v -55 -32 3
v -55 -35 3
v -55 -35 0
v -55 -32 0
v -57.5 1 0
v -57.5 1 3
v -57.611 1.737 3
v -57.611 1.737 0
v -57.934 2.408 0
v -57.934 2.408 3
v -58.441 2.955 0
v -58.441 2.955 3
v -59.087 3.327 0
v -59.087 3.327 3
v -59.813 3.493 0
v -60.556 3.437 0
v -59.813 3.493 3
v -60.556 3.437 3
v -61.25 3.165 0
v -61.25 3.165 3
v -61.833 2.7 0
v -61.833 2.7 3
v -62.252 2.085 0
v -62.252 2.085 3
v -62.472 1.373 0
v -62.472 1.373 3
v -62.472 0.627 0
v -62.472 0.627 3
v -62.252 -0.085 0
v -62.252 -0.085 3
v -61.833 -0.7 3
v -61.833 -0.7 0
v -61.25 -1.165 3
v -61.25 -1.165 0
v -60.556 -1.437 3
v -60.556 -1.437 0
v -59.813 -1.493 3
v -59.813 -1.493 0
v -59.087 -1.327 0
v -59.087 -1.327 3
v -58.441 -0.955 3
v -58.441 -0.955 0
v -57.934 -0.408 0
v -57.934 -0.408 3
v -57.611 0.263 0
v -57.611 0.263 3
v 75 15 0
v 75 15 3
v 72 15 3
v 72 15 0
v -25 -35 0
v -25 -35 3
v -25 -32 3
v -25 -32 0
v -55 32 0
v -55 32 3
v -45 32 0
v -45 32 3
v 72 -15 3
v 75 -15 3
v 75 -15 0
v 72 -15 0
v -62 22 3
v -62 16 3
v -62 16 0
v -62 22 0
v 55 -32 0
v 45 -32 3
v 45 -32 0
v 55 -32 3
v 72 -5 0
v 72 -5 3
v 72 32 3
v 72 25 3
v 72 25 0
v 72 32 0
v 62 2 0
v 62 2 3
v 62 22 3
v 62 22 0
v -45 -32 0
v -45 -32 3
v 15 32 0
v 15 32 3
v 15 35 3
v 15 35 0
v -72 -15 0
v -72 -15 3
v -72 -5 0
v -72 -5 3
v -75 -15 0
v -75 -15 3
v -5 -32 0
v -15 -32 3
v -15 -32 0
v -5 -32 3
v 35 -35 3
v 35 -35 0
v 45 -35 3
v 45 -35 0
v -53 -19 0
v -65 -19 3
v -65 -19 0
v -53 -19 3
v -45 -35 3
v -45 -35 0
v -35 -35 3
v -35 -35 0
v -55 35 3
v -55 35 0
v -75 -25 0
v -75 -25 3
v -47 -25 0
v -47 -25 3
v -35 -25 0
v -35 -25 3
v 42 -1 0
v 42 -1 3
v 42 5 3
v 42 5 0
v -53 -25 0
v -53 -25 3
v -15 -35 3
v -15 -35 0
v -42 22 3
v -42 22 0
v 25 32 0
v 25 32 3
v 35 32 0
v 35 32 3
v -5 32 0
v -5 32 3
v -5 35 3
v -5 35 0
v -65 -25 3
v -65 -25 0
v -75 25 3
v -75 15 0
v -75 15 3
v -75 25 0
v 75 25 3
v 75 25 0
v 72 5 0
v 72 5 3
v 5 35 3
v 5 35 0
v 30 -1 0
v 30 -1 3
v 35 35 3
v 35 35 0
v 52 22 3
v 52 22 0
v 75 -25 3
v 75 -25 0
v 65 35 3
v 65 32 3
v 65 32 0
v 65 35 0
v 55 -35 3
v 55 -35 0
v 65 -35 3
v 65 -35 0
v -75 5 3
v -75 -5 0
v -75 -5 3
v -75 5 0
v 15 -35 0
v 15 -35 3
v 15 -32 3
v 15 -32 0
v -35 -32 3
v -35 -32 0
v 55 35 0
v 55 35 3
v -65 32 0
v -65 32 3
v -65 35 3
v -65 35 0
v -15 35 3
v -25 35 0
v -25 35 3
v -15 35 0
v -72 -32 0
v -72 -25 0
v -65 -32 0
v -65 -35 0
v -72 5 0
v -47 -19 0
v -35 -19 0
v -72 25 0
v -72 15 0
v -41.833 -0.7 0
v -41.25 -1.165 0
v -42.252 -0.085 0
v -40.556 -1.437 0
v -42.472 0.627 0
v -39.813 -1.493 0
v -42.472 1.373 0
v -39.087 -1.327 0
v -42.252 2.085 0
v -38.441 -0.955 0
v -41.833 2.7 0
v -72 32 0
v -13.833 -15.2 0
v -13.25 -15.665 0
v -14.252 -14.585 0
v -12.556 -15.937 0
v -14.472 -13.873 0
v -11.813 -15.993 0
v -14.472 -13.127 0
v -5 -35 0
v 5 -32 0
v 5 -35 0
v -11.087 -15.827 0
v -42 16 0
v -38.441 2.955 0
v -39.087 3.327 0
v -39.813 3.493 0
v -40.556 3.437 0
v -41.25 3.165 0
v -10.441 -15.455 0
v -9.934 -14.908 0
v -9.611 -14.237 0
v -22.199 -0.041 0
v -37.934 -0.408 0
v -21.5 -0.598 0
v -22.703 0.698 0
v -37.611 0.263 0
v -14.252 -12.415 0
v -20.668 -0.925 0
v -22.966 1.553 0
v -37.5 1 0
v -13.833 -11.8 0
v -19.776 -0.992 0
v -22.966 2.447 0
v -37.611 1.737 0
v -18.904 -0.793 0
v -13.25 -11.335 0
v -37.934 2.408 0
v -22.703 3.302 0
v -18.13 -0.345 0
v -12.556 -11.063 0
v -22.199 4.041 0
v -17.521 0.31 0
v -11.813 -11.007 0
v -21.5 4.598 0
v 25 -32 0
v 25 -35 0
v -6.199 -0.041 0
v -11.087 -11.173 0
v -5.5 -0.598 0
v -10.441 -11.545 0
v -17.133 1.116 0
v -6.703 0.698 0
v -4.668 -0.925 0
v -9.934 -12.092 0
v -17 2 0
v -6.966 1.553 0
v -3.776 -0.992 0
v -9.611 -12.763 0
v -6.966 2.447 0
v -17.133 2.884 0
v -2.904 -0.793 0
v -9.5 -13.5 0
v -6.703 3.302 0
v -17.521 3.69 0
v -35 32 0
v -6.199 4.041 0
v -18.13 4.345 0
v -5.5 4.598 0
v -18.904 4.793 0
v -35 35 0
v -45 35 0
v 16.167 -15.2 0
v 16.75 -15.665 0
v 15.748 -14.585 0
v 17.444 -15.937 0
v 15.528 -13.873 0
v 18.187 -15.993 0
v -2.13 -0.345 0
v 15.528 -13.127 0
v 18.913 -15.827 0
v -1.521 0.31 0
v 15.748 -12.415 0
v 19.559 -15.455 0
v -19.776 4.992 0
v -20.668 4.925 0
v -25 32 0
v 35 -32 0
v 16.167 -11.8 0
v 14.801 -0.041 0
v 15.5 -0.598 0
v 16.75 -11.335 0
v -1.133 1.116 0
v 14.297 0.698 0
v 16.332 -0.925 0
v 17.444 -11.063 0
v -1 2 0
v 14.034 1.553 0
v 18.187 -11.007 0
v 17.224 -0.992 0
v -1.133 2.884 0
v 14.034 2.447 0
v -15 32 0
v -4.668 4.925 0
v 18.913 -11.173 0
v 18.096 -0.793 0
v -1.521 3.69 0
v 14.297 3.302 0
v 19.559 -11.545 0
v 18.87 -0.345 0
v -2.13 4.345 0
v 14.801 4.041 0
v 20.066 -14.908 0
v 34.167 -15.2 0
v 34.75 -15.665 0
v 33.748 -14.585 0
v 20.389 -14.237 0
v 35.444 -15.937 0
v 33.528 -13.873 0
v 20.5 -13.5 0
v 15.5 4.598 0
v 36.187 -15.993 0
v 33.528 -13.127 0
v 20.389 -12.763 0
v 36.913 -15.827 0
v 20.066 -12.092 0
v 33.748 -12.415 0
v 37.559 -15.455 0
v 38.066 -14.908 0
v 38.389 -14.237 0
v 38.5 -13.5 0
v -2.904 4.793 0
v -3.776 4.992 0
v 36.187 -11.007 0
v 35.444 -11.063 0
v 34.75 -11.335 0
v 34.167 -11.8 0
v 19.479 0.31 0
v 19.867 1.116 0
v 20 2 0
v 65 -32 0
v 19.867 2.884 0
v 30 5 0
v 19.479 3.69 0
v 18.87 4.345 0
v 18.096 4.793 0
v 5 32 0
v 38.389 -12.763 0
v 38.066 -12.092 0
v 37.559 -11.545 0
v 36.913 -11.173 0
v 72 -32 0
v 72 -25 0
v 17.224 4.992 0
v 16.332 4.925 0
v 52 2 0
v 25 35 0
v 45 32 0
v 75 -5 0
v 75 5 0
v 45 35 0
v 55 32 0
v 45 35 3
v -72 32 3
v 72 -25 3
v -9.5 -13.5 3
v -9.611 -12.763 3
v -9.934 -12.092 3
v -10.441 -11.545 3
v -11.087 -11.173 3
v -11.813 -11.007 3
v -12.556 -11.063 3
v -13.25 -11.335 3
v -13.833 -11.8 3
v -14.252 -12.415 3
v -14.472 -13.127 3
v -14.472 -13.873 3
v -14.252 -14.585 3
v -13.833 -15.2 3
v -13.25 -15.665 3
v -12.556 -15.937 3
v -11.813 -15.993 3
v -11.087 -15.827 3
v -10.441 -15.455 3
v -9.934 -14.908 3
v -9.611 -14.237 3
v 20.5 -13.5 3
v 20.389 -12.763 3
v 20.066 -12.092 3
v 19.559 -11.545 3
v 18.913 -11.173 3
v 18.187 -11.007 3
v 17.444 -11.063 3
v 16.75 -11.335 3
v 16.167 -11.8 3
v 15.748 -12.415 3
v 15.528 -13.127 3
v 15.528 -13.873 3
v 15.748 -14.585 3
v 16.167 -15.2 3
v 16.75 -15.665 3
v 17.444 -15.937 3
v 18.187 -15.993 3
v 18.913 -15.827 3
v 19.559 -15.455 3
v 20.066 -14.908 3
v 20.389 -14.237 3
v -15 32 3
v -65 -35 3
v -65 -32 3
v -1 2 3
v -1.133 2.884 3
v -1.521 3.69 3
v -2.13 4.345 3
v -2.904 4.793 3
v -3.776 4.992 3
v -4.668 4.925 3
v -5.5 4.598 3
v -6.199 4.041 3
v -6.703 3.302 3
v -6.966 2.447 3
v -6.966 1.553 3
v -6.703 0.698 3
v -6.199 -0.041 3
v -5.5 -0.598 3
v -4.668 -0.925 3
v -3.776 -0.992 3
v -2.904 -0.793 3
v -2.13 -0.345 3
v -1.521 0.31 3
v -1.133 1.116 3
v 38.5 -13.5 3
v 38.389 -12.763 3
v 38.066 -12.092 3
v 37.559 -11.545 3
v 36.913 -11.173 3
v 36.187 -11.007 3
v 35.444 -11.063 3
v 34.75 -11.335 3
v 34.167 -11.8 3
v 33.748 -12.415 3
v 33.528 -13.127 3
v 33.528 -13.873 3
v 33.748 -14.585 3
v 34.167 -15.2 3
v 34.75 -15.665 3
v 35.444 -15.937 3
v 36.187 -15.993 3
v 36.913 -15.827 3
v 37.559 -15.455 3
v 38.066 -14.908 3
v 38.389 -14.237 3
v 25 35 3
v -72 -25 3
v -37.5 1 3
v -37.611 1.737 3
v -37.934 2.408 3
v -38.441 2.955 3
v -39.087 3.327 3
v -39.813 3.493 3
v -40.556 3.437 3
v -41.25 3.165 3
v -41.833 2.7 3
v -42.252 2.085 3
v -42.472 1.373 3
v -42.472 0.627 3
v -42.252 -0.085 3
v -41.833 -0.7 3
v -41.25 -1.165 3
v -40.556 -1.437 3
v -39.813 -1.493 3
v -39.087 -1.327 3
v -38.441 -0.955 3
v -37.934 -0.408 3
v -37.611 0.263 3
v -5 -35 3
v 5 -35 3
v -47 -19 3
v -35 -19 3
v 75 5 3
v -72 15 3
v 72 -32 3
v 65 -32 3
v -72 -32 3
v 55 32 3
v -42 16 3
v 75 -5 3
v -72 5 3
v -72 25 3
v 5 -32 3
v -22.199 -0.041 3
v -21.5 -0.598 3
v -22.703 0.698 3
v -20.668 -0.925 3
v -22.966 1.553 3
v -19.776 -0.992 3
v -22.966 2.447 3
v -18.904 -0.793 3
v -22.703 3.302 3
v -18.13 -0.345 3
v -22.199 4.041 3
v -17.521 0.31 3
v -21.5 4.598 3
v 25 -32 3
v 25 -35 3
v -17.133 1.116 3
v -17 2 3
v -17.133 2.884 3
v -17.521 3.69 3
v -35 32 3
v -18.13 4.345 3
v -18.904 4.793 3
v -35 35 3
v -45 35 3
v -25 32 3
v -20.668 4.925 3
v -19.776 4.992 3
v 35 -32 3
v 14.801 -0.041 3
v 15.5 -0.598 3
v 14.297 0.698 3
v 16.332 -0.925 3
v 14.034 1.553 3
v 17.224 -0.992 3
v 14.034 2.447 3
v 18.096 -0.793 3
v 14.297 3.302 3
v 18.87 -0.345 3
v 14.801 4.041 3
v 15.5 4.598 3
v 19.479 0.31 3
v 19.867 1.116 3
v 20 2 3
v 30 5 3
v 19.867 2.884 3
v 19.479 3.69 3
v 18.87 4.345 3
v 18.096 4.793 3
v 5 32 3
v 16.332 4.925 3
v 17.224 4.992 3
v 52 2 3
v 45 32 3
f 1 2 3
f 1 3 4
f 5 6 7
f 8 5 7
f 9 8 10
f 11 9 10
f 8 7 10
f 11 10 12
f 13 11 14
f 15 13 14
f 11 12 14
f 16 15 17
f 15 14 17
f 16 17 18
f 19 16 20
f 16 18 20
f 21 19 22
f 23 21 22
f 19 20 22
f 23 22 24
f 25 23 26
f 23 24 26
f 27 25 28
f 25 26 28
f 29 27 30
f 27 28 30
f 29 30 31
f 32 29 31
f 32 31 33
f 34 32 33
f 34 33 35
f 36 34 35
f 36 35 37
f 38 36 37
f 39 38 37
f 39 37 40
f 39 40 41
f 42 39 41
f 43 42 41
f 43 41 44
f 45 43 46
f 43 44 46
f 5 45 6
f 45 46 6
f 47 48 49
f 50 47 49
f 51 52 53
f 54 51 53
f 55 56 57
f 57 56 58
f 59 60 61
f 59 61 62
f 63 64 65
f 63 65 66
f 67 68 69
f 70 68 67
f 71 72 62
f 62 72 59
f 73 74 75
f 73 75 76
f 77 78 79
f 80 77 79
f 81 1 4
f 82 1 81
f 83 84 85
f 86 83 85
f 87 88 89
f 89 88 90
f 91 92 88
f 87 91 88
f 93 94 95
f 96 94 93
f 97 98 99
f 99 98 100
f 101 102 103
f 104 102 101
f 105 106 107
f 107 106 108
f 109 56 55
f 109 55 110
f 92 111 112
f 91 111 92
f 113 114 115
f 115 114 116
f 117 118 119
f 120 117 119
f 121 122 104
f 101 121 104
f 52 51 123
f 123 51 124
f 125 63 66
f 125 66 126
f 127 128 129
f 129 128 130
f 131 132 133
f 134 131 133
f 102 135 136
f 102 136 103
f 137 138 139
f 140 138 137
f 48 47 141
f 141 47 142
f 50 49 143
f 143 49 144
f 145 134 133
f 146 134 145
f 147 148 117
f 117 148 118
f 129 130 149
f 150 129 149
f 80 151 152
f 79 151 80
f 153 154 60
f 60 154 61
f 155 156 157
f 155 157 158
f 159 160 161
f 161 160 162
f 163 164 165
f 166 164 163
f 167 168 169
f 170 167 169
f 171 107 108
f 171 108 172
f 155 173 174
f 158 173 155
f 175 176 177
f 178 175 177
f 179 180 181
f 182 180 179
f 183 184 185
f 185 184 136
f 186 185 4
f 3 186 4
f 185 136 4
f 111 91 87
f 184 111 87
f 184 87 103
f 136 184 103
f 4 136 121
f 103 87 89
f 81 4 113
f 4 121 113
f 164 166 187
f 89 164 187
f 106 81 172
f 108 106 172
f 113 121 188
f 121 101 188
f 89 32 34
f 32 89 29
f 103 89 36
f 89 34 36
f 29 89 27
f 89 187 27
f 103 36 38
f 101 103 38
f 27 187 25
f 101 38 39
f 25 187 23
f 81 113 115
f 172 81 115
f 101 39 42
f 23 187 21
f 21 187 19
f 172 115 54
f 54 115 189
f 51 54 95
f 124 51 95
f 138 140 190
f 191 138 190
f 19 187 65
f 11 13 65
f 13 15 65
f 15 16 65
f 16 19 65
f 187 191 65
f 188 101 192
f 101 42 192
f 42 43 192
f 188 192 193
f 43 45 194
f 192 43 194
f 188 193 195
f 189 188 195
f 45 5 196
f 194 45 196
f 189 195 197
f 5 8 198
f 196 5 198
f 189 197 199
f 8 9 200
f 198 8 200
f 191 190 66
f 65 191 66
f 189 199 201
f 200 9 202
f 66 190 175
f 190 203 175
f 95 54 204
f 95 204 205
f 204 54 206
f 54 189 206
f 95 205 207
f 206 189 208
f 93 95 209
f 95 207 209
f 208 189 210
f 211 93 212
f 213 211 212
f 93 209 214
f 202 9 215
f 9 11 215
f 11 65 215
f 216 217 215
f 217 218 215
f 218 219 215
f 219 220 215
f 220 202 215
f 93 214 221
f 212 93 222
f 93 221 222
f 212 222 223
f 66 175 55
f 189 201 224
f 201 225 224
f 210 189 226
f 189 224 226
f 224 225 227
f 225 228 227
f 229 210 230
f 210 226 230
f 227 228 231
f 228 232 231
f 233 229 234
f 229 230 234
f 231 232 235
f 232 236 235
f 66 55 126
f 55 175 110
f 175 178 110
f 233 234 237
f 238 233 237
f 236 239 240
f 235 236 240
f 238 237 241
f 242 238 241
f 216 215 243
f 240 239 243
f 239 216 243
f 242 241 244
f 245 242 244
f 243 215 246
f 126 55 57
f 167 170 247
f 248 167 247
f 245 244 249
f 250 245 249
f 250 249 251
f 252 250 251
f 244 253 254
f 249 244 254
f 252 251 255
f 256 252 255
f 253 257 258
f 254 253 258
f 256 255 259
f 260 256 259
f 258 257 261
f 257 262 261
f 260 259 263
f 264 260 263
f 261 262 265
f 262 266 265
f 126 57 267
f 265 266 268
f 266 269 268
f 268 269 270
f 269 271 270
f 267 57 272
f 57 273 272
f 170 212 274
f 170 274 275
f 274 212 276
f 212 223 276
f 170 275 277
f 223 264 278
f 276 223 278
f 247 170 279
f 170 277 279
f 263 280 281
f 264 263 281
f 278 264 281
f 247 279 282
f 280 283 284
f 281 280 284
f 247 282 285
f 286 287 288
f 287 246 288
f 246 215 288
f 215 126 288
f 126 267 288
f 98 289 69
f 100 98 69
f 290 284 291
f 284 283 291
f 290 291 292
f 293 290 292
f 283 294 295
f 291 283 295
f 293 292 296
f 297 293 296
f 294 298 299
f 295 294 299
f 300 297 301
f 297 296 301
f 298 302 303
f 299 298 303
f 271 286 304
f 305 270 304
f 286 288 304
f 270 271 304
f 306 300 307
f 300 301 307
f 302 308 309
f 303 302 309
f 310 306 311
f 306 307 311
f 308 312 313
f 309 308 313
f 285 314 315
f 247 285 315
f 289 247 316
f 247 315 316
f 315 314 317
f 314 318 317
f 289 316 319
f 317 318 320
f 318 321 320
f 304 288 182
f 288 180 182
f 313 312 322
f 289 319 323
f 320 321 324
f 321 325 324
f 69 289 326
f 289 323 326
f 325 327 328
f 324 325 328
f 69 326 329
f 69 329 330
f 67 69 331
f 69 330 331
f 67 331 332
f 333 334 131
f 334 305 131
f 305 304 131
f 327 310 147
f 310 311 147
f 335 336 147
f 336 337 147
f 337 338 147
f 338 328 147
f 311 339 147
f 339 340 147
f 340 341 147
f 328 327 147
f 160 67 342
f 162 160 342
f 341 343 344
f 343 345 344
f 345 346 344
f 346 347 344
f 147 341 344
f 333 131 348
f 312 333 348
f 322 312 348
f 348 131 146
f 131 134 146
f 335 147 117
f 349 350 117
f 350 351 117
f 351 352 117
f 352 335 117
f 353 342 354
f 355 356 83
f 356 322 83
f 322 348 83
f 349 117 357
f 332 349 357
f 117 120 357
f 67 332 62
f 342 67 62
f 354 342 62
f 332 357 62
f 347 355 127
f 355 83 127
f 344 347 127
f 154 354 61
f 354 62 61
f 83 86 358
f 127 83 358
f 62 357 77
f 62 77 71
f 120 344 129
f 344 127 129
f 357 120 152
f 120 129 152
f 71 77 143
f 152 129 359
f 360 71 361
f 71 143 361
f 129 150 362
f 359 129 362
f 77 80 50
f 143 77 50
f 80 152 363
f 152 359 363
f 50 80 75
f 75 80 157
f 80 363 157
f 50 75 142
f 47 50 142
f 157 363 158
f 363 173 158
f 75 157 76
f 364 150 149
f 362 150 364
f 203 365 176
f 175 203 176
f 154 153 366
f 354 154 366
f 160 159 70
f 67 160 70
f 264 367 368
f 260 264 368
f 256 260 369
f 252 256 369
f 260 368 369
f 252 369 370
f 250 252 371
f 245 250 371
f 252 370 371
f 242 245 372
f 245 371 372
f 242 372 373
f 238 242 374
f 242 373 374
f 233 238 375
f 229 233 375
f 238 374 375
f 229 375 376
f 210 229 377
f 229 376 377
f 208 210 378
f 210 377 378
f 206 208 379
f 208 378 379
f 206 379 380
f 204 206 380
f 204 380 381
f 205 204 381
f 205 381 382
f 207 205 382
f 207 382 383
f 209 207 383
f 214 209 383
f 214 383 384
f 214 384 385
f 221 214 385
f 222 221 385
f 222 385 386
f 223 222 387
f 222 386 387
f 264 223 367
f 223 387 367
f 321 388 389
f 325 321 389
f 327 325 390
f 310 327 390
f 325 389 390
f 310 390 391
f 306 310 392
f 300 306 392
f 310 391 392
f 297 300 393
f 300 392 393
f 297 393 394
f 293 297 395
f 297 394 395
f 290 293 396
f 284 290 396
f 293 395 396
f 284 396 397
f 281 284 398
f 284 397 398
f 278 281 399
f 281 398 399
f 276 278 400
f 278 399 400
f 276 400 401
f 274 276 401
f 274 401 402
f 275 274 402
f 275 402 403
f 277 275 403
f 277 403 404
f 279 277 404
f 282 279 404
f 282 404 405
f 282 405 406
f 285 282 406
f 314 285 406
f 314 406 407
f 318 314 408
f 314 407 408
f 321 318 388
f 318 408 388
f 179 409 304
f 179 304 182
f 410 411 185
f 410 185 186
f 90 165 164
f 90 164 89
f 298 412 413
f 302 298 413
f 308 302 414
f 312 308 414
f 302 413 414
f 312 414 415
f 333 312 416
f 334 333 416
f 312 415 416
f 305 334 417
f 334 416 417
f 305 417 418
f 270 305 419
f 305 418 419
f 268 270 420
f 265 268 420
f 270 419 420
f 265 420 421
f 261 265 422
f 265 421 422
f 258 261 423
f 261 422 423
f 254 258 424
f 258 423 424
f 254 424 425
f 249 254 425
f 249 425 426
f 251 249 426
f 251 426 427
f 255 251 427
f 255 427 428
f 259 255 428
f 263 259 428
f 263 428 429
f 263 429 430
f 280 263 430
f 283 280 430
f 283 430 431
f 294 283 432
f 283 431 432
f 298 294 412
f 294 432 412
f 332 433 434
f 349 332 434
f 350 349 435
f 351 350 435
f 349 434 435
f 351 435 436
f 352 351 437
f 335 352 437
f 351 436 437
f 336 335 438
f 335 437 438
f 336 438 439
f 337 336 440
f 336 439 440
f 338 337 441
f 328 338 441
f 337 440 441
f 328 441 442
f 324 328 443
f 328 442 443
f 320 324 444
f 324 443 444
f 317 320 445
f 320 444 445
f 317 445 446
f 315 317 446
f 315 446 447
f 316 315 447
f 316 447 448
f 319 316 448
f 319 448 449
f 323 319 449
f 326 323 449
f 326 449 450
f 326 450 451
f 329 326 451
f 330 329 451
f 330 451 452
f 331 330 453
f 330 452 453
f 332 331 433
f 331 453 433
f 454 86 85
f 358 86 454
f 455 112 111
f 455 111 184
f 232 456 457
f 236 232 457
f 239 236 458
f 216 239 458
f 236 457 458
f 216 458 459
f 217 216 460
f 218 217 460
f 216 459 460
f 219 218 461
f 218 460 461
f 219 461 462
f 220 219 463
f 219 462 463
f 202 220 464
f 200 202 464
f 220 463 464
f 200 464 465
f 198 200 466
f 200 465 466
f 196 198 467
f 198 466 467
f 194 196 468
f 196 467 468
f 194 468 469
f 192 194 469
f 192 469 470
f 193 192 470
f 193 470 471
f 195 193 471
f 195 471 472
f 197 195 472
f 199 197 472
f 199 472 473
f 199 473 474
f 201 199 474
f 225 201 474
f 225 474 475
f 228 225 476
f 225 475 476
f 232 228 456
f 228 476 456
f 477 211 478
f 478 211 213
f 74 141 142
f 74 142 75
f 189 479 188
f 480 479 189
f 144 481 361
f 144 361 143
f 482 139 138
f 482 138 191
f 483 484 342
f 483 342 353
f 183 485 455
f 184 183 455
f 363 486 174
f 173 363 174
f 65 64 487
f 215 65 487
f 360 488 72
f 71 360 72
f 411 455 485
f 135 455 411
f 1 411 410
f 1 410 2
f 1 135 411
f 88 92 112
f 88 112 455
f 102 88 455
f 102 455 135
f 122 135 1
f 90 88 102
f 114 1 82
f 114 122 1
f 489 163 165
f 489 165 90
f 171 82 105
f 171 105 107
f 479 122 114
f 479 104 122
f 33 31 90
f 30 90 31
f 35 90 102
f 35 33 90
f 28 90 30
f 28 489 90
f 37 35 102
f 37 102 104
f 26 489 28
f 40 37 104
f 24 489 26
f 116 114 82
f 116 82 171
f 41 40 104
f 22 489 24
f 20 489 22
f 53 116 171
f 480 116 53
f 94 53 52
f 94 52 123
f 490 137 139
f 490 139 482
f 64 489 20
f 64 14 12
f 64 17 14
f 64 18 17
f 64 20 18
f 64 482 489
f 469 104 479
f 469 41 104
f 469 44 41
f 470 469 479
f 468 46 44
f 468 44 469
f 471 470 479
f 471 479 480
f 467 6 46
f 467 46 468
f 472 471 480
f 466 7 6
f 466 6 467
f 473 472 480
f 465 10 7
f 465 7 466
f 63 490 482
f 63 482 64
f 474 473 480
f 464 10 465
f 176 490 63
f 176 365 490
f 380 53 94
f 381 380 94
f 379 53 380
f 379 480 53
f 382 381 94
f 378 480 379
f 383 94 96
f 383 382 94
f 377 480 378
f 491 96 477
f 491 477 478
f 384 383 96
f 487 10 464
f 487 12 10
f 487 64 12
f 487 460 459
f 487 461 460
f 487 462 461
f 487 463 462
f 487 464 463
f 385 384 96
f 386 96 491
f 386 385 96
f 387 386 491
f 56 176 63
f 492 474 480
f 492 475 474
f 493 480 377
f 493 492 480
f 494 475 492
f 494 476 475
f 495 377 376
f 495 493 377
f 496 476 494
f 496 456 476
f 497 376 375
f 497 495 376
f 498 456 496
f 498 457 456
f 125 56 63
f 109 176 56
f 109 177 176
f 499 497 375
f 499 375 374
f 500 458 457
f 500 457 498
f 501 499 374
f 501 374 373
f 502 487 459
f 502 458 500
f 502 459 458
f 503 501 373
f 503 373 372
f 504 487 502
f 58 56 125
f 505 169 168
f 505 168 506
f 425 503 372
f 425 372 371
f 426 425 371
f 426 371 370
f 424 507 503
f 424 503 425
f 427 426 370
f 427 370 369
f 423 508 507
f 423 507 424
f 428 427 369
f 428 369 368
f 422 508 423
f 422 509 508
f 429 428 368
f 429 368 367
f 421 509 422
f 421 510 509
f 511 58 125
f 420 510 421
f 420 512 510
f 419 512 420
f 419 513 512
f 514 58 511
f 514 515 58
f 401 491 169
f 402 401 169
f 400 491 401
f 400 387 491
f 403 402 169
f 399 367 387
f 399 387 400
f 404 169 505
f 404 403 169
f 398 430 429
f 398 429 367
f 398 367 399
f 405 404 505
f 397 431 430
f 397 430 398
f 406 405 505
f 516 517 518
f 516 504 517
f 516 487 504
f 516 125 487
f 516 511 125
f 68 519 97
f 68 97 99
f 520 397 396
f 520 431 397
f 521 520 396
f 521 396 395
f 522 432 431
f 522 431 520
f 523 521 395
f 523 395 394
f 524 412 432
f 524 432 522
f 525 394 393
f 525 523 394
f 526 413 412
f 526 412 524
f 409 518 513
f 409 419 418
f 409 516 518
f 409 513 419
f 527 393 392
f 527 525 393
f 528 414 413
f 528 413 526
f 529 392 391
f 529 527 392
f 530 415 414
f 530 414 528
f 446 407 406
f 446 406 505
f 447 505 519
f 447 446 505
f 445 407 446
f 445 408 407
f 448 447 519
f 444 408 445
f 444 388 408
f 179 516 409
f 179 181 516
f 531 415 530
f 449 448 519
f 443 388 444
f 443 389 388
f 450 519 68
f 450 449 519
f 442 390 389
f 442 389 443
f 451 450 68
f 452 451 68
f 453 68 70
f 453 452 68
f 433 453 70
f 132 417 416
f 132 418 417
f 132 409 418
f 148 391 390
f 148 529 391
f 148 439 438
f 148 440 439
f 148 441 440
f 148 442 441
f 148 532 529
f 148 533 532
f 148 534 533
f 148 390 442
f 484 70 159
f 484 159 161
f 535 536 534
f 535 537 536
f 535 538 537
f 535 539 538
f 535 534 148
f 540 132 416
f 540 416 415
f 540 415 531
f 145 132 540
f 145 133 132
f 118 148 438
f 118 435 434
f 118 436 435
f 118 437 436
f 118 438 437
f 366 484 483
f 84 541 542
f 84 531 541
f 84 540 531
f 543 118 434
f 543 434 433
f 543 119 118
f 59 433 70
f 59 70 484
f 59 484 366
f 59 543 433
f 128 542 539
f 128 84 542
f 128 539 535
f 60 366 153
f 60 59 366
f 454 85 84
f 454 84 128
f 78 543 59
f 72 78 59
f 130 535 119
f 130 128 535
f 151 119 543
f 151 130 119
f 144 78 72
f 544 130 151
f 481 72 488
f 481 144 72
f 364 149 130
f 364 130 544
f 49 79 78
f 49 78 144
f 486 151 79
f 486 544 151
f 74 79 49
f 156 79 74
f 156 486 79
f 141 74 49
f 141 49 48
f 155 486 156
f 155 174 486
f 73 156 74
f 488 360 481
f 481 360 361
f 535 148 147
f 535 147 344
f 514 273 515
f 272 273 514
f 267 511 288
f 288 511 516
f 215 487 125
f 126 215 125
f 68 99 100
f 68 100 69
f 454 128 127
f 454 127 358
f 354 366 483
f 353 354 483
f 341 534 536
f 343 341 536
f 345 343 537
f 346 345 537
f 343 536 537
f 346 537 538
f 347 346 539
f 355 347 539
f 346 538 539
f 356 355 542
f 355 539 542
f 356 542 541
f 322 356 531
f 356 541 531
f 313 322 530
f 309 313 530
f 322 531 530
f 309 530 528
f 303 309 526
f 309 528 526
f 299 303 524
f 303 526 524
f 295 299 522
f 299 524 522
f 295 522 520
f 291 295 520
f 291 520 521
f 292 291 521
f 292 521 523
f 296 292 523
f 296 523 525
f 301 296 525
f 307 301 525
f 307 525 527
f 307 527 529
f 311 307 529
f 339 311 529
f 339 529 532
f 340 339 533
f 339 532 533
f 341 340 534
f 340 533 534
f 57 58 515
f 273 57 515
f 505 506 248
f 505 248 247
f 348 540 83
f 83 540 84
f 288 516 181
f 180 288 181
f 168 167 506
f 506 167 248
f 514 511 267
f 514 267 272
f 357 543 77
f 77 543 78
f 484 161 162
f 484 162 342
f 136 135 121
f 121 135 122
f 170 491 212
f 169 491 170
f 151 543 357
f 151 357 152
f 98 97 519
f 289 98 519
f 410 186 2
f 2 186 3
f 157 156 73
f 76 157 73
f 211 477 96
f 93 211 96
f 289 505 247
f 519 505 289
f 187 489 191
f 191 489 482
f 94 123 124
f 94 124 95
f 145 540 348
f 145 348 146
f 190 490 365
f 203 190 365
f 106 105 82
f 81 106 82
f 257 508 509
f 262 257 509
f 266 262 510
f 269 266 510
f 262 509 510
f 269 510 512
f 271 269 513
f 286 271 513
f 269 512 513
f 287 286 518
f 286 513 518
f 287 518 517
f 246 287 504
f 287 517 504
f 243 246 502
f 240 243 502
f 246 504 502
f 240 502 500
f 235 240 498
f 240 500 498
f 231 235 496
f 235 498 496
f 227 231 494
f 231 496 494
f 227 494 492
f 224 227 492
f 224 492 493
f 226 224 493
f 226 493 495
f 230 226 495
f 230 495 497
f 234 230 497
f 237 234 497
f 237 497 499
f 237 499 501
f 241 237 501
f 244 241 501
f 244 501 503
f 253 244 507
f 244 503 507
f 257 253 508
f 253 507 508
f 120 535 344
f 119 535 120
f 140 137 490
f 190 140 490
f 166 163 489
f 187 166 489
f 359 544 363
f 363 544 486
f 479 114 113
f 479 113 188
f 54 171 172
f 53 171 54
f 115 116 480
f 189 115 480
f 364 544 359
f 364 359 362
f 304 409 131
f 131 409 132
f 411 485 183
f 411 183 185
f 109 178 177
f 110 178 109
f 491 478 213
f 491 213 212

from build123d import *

# Parameters (mm, degrees)
SKETCH1_W               = 150
SKETCH1_H               = 70
BOSS_EXTRUDE1_DEPTH     = 3
SKETCH2_W               = 10
SKETCH2_H               = 3
CUT_EXTRUDE1_DEPTH      = 3
LPATTERN3_COUNT         = 8
LPATTERN3_PITCH         = 20
MIRROR1_COPY_1_SKETCH_W = 10
MIRROR1_COPY_1_SKETCH_H = 3
MIRROR1_COPY_1_DEPTH    = 3
MIRROR1_COPY_2_SKETCH_W = 10
MIRROR1_COPY_2_SKETCH_H = 3
MIRROR1_COPY_2_DEPTH    = 3
MIRROR1_COPY_3_SKETCH_W = 10
MIRROR1_COPY_3_SKETCH_H = 3
MIRROR1_COPY_3_DEPTH    = 3
MIRROR1_COPY_4_SKETCH_W = 10
MIRROR1_COPY_4_SKETCH_H = 3
MIRROR1_COPY_4_DEPTH    = 3
MIRROR1_COPY_5_SKETCH_W = 10
MIRROR1_COPY_5_SKETCH_H = 3
MIRROR1_COPY_5_DEPTH    = 3
MIRROR1_COPY_6_SKETCH_W = 10
MIRROR1_COPY_6_SKETCH_H = 3
MIRROR1_COPY_6_DEPTH    = 3
MIRROR1_COPY_7_SKETCH_W = 10
MIRROR1_COPY_7_SKETCH_H = 3
MIRROR1_COPY_7_DEPTH    = 3
SKETCH3_W               = 3
SKETCH3_H               = 10
CUT_EXTRUDE2_DEPTH      = 3
LPATTERN4_COUNT         = 4
LPATTERN4_PITCH         = 20
MIRROR2_COPY_1_SKETCH_W = 3
MIRROR2_COPY_1_SKETCH_H = 10
MIRROR2_COPY_1_DEPTH    = 3
MIRROR2_COPY_2_SKETCH_W = 3
MIRROR2_COPY_2_SKETCH_H = 10
MIRROR2_COPY_2_DEPTH    = 3
MIRROR2_COPY_3_SKETCH_W = 3
MIRROR2_COPY_3_SKETCH_H = 10
MIRROR2_COPY_3_DEPTH    = 3
SKETCH4_W               = 20
SKETCH4_H               = 6
CUT_EXTRUDE3_DEPTH      = 3
SKETCH5_R               = 2.5
CUT_EXTRUDE5_DEPTH      = 3
SKETCH6_W               = 12
SKETCH6_H               = 6
CUT_EXTRUDE6_DEPTH      = 3
SKETCH7_R               = 3
CUT_EXTRUDE7_DEPTH      = 3
SKETCH8_R               = 2.5
CUT_EXTRUDE8_DEPTH      = 3
SKETCH9_R               = 3
CUT_EXTRUDE9_DEPTH      = 3
SKETCH10_W              = 12
SKETCH10_H              = 6
CUT_EXTRUDE10_DEPTH     = 3
SKETCH11_R              = 2.5
CUT_EXTRUDE11_DEPTH     = 3
SKETCH12_W              = 10
SKETCH12_H              = 20
CUT_EXTRUDE12_DEPTH     = 3


with BuildPart() as part:
    # Sketch1 → Boss-Extrude1 (new body)
    with BuildSketch(Plane.XY):
        Rectangle(SKETCH1_W, SKETCH1_H)
    extrude(amount=BOSS_EXTRUDE1_DEPTH)

    # Sketch2 → Cut-Extrude1 (cut)
    with BuildSketch(Plane.XY.offset(3)):
        with Locations((-70, 33.5)):
            Rectangle(SKETCH2_W, SKETCH2_H)
    cut_extrude1 = extrude(amount=-CUT_EXTRUDE1_DEPTH, mode=Mode.SUBTRACT)

    # LPattern3: Cut-Extrude1 ×8
    with Locations(*[(i * LPATTERN3_PITCH, 0, 0) for i in range(1, LPATTERN3_COUNT)]):
        add(cut_extrude1, mode=Mode.SUBTRACT)

    # Mirror1: Cut-Extrude1 across plane
    add(cut_extrude1.mirror(Plane.ZX), mode=Mode.SUBTRACT)

    # Mirror1 copy 1 sketch → Mirror1 copy 1 (cut)
    with BuildSketch(Plane(origin=(20, 0, 3), x_dir=(1, 0, 0), z_dir=(0, 0, 1))):
        with Locations((-70, -33.5)):
            Rectangle(MIRROR1_COPY_1_SKETCH_W, MIRROR1_COPY_1_SKETCH_H)
    extrude(amount=-MIRROR1_COPY_1_DEPTH, mode=Mode.SUBTRACT)

    # Mirror1 copy 2 sketch → Mirror1 copy 2 (cut)
    with BuildSketch(Plane(origin=(40, 0, 3), x_dir=(1, 0, 0), z_dir=(0, 0, 1))):
        with Locations((-70, -33.5)):
            Rectangle(MIRROR1_COPY_2_SKETCH_W, MIRROR1_COPY_2_SKETCH_H)
    extrude(amount=-MIRROR1_COPY_2_DEPTH, mode=Mode.SUBTRACT)

    # Mirror1 copy 3 sketch → Mirror1 copy 3 (cut)
    with BuildSketch(Plane(origin=(60, 0, 3), x_dir=(1, 0, 0), z_dir=(0, 0, 1))):
        with Locations((-70, -33.5)):
            Rectangle(MIRROR1_COPY_3_SKETCH_W, MIRROR1_COPY_3_SKETCH_H)
    extrude(amount=-MIRROR1_COPY_3_DEPTH, mode=Mode.SUBTRACT)

    # Mirror1 copy 4 sketch → Mirror1 copy 4 (cut)
    with BuildSketch(Plane(origin=(80, 0, 3), x_dir=(1, 0, 0), z_dir=(0, 0, 1))):
        with Locations((-70, -33.5)):
            Rectangle(MIRROR1_COPY_4_SKETCH_W, MIRROR1_COPY_4_SKETCH_H)
    extrude(amount=-MIRROR1_COPY_4_DEPTH, mode=Mode.SUBTRACT)

    # Mirror1 copy 5 sketch → Mirror1 copy 5 (cut)
    with BuildSketch(Plane(origin=(100, 0, 3), x_dir=(1, 0, 0), z_dir=(0, 0, 1))):
        with Locations((-70, -33.5)):
            Rectangle(MIRROR1_COPY_5_SKETCH_W, MIRROR1_COPY_5_SKETCH_H)
    extrude(amount=-MIRROR1_COPY_5_DEPTH, mode=Mode.SUBTRACT)

    # Mirror1 copy 6 sketch → Mirror1 copy 6 (cut)
    with BuildSketch(Plane(origin=(120, 0, 3), x_dir=(1, 0, 0), z_dir=(0, 0, 1))):
        with Locations((-70, -33.5)):
            Rectangle(MIRROR1_COPY_6_SKETCH_W, MIRROR1_COPY_6_SKETCH_H)
    extrude(amount=-MIRROR1_COPY_6_DEPTH, mode=Mode.SUBTRACT)

    # Mirror1 copy 7 sketch → Mirror1 copy 7 (cut)
    with BuildSketch(Plane(origin=(140, 0, 3), x_dir=(1, 0, 0), z_dir=(0, 0, 1))):
        with Locations((-70, -33.5)):
            Rectangle(MIRROR1_COPY_7_SKETCH_W, MIRROR1_COPY_7_SKETCH_H)
    extrude(amount=-MIRROR1_COPY_7_DEPTH, mode=Mode.SUBTRACT)

    # Sketch3 → Cut-Extrude2 (cut)
    with BuildSketch(Plane.XY.offset(3)):
        with Locations((-73.5, 30)):
            Rectangle(SKETCH3_W, SKETCH3_H)
    cut_extrude2 = extrude(amount=-CUT_EXTRUDE2_DEPTH, mode=Mode.SUBTRACT)

    # LPattern4: Cut-Extrude2 ×4
    with Locations(*[(0, -i * LPATTERN4_PITCH, 0) for i in range(1, LPATTERN4_COUNT)]):
        add(cut_extrude2, mode=Mode.SUBTRACT)

    # Mirror2: Cut-Extrude2 across plane
    add(cut_extrude2.mirror(Plane(origin=(0, 0, 0), x_dir=(0, 0, 1), z_dir=(1, 0, 0))), mode=Mode.SUBTRACT)

    # Mirror2 copy 1 sketch → Mirror2 copy 1 (cut)
    with BuildSketch(Plane(origin=(0, -20, 3), x_dir=(-1, 0, 0), z_dir=(0, 0, 1))):
        with Locations((-73.5, -30)):
            Rectangle(MIRROR2_COPY_1_SKETCH_W, MIRROR2_COPY_1_SKETCH_H)
    extrude(amount=-MIRROR2_COPY_1_DEPTH, mode=Mode.SUBTRACT)

    # Mirror2 copy 2 sketch → Mirror2 copy 2 (cut)
    with BuildSketch(Plane(origin=(0, -40, 3), x_dir=(-1, 0, 0), z_dir=(0, 0, 1))):
        with Locations((-73.5, -30)):
            Rectangle(MIRROR2_COPY_2_SKETCH_W, MIRROR2_COPY_2_SKETCH_H)
    extrude(amount=-MIRROR2_COPY_2_DEPTH, mode=Mode.SUBTRACT)

    # Mirror2 copy 3 sketch → Mirror2 copy 3 (cut)
    with BuildSketch(Plane(origin=(0, -60, 3), x_dir=(-1, 0, 0), z_dir=(0, 0, 1))):
        with Locations((-73.5, -30)):
            Rectangle(MIRROR2_COPY_3_SKETCH_W, MIRROR2_COPY_3_SKETCH_H)
    extrude(amount=-MIRROR2_COPY_3_DEPTH, mode=Mode.SUBTRACT)

    # Sketch4 → Cut-Extrude3 (cut)
    with BuildSketch(Plane.XY.offset(3)):
        with Locations((-52, 19)):
            Rectangle(SKETCH4_W, SKETCH4_H)
    extrude(amount=-CUT_EXTRUDE3_DEPTH, mode=Mode.SUBTRACT)

    # Sketch5 → Cut-Extrude5 (cut)
    with BuildSketch(Plane.XY.offset(3)):
        with Locations((-60, 1)):
            Circle(SKETCH5_R)
        with Locations((-40, 1)):
            Circle(SKETCH5_R)
    extrude(amount=-CUT_EXTRUDE5_DEPTH, mode=Mode.SUBTRACT)

    # Sketch6 → Cut-Extrude6 (cut)
    with BuildSketch(Plane.XY.offset(3)):
        with Locations((-59, -22)):
            Rectangle(SKETCH6_W, SKETCH6_H)
        with Locations((-41, -22)):
            Rectangle(SKETCH6_W, SKETCH6_H)
    extrude(amount=-CUT_EXTRUDE6_DEPTH, mode=Mode.SUBTRACT)

    # Sketch7 → Cut-Extrude7 (cut)
    with BuildSketch(Plane.XY.offset(3)):
        with Locations((-20, 2)):
            Circle(SKETCH7_R)
        with Locations((-4, 2)):
            Circle(SKETCH7_R)
    extrude(amount=-CUT_EXTRUDE7_DEPTH, mode=Mode.SUBTRACT)

    # Sketch8 → Cut-Extrude8 (cut)
    with BuildSketch(Plane.XY.offset(3)):
        with Locations((-12, -13.5)):
            Circle(SKETCH8_R)
    extrude(amount=-CUT_EXTRUDE8_DEPTH, mode=Mode.SUBTRACT)

    # Sketch9 → Cut-Extrude9 (cut)
    with BuildSketch(Plane.XY.offset(3)):
        with Locations((17, 2)):
            Circle(SKETCH9_R)
    extrude(amount=-CUT_EXTRUDE9_DEPTH, mode=Mode.SUBTRACT)

    # Sketch10 → Cut-Extrude10 (cut)
    with BuildSketch(Plane.XY.offset(3)):
        with Locations((36, 2)):
            Rectangle(SKETCH10_W, SKETCH10_H)
    extrude(amount=-CUT_EXTRUDE10_DEPTH, mode=Mode.SUBTRACT)

    # Sketch11 → Cut-Extrude11 (cut)
    with BuildSketch(Plane.XY.offset(3)):
        with Locations((18, -13.5)):
            Circle(SKETCH11_R)
        with Locations((36, -13.5)):
            Circle(SKETCH11_R)
    extrude(amount=-CUT_EXTRUDE11_DEPTH, mode=Mode.SUBTRACT)

    # Sketch12 → Cut-Extrude12 (cut)
    with BuildSketch(Plane.XY.offset(3)):
        with Locations((57, 12)):
            Rectangle(SKETCH12_W, SKETCH12_H)
    extrude(amount=-CUT_EXTRUDE12_DEPTH, mode=Mode.SUBTRACT)


solid = part.part
